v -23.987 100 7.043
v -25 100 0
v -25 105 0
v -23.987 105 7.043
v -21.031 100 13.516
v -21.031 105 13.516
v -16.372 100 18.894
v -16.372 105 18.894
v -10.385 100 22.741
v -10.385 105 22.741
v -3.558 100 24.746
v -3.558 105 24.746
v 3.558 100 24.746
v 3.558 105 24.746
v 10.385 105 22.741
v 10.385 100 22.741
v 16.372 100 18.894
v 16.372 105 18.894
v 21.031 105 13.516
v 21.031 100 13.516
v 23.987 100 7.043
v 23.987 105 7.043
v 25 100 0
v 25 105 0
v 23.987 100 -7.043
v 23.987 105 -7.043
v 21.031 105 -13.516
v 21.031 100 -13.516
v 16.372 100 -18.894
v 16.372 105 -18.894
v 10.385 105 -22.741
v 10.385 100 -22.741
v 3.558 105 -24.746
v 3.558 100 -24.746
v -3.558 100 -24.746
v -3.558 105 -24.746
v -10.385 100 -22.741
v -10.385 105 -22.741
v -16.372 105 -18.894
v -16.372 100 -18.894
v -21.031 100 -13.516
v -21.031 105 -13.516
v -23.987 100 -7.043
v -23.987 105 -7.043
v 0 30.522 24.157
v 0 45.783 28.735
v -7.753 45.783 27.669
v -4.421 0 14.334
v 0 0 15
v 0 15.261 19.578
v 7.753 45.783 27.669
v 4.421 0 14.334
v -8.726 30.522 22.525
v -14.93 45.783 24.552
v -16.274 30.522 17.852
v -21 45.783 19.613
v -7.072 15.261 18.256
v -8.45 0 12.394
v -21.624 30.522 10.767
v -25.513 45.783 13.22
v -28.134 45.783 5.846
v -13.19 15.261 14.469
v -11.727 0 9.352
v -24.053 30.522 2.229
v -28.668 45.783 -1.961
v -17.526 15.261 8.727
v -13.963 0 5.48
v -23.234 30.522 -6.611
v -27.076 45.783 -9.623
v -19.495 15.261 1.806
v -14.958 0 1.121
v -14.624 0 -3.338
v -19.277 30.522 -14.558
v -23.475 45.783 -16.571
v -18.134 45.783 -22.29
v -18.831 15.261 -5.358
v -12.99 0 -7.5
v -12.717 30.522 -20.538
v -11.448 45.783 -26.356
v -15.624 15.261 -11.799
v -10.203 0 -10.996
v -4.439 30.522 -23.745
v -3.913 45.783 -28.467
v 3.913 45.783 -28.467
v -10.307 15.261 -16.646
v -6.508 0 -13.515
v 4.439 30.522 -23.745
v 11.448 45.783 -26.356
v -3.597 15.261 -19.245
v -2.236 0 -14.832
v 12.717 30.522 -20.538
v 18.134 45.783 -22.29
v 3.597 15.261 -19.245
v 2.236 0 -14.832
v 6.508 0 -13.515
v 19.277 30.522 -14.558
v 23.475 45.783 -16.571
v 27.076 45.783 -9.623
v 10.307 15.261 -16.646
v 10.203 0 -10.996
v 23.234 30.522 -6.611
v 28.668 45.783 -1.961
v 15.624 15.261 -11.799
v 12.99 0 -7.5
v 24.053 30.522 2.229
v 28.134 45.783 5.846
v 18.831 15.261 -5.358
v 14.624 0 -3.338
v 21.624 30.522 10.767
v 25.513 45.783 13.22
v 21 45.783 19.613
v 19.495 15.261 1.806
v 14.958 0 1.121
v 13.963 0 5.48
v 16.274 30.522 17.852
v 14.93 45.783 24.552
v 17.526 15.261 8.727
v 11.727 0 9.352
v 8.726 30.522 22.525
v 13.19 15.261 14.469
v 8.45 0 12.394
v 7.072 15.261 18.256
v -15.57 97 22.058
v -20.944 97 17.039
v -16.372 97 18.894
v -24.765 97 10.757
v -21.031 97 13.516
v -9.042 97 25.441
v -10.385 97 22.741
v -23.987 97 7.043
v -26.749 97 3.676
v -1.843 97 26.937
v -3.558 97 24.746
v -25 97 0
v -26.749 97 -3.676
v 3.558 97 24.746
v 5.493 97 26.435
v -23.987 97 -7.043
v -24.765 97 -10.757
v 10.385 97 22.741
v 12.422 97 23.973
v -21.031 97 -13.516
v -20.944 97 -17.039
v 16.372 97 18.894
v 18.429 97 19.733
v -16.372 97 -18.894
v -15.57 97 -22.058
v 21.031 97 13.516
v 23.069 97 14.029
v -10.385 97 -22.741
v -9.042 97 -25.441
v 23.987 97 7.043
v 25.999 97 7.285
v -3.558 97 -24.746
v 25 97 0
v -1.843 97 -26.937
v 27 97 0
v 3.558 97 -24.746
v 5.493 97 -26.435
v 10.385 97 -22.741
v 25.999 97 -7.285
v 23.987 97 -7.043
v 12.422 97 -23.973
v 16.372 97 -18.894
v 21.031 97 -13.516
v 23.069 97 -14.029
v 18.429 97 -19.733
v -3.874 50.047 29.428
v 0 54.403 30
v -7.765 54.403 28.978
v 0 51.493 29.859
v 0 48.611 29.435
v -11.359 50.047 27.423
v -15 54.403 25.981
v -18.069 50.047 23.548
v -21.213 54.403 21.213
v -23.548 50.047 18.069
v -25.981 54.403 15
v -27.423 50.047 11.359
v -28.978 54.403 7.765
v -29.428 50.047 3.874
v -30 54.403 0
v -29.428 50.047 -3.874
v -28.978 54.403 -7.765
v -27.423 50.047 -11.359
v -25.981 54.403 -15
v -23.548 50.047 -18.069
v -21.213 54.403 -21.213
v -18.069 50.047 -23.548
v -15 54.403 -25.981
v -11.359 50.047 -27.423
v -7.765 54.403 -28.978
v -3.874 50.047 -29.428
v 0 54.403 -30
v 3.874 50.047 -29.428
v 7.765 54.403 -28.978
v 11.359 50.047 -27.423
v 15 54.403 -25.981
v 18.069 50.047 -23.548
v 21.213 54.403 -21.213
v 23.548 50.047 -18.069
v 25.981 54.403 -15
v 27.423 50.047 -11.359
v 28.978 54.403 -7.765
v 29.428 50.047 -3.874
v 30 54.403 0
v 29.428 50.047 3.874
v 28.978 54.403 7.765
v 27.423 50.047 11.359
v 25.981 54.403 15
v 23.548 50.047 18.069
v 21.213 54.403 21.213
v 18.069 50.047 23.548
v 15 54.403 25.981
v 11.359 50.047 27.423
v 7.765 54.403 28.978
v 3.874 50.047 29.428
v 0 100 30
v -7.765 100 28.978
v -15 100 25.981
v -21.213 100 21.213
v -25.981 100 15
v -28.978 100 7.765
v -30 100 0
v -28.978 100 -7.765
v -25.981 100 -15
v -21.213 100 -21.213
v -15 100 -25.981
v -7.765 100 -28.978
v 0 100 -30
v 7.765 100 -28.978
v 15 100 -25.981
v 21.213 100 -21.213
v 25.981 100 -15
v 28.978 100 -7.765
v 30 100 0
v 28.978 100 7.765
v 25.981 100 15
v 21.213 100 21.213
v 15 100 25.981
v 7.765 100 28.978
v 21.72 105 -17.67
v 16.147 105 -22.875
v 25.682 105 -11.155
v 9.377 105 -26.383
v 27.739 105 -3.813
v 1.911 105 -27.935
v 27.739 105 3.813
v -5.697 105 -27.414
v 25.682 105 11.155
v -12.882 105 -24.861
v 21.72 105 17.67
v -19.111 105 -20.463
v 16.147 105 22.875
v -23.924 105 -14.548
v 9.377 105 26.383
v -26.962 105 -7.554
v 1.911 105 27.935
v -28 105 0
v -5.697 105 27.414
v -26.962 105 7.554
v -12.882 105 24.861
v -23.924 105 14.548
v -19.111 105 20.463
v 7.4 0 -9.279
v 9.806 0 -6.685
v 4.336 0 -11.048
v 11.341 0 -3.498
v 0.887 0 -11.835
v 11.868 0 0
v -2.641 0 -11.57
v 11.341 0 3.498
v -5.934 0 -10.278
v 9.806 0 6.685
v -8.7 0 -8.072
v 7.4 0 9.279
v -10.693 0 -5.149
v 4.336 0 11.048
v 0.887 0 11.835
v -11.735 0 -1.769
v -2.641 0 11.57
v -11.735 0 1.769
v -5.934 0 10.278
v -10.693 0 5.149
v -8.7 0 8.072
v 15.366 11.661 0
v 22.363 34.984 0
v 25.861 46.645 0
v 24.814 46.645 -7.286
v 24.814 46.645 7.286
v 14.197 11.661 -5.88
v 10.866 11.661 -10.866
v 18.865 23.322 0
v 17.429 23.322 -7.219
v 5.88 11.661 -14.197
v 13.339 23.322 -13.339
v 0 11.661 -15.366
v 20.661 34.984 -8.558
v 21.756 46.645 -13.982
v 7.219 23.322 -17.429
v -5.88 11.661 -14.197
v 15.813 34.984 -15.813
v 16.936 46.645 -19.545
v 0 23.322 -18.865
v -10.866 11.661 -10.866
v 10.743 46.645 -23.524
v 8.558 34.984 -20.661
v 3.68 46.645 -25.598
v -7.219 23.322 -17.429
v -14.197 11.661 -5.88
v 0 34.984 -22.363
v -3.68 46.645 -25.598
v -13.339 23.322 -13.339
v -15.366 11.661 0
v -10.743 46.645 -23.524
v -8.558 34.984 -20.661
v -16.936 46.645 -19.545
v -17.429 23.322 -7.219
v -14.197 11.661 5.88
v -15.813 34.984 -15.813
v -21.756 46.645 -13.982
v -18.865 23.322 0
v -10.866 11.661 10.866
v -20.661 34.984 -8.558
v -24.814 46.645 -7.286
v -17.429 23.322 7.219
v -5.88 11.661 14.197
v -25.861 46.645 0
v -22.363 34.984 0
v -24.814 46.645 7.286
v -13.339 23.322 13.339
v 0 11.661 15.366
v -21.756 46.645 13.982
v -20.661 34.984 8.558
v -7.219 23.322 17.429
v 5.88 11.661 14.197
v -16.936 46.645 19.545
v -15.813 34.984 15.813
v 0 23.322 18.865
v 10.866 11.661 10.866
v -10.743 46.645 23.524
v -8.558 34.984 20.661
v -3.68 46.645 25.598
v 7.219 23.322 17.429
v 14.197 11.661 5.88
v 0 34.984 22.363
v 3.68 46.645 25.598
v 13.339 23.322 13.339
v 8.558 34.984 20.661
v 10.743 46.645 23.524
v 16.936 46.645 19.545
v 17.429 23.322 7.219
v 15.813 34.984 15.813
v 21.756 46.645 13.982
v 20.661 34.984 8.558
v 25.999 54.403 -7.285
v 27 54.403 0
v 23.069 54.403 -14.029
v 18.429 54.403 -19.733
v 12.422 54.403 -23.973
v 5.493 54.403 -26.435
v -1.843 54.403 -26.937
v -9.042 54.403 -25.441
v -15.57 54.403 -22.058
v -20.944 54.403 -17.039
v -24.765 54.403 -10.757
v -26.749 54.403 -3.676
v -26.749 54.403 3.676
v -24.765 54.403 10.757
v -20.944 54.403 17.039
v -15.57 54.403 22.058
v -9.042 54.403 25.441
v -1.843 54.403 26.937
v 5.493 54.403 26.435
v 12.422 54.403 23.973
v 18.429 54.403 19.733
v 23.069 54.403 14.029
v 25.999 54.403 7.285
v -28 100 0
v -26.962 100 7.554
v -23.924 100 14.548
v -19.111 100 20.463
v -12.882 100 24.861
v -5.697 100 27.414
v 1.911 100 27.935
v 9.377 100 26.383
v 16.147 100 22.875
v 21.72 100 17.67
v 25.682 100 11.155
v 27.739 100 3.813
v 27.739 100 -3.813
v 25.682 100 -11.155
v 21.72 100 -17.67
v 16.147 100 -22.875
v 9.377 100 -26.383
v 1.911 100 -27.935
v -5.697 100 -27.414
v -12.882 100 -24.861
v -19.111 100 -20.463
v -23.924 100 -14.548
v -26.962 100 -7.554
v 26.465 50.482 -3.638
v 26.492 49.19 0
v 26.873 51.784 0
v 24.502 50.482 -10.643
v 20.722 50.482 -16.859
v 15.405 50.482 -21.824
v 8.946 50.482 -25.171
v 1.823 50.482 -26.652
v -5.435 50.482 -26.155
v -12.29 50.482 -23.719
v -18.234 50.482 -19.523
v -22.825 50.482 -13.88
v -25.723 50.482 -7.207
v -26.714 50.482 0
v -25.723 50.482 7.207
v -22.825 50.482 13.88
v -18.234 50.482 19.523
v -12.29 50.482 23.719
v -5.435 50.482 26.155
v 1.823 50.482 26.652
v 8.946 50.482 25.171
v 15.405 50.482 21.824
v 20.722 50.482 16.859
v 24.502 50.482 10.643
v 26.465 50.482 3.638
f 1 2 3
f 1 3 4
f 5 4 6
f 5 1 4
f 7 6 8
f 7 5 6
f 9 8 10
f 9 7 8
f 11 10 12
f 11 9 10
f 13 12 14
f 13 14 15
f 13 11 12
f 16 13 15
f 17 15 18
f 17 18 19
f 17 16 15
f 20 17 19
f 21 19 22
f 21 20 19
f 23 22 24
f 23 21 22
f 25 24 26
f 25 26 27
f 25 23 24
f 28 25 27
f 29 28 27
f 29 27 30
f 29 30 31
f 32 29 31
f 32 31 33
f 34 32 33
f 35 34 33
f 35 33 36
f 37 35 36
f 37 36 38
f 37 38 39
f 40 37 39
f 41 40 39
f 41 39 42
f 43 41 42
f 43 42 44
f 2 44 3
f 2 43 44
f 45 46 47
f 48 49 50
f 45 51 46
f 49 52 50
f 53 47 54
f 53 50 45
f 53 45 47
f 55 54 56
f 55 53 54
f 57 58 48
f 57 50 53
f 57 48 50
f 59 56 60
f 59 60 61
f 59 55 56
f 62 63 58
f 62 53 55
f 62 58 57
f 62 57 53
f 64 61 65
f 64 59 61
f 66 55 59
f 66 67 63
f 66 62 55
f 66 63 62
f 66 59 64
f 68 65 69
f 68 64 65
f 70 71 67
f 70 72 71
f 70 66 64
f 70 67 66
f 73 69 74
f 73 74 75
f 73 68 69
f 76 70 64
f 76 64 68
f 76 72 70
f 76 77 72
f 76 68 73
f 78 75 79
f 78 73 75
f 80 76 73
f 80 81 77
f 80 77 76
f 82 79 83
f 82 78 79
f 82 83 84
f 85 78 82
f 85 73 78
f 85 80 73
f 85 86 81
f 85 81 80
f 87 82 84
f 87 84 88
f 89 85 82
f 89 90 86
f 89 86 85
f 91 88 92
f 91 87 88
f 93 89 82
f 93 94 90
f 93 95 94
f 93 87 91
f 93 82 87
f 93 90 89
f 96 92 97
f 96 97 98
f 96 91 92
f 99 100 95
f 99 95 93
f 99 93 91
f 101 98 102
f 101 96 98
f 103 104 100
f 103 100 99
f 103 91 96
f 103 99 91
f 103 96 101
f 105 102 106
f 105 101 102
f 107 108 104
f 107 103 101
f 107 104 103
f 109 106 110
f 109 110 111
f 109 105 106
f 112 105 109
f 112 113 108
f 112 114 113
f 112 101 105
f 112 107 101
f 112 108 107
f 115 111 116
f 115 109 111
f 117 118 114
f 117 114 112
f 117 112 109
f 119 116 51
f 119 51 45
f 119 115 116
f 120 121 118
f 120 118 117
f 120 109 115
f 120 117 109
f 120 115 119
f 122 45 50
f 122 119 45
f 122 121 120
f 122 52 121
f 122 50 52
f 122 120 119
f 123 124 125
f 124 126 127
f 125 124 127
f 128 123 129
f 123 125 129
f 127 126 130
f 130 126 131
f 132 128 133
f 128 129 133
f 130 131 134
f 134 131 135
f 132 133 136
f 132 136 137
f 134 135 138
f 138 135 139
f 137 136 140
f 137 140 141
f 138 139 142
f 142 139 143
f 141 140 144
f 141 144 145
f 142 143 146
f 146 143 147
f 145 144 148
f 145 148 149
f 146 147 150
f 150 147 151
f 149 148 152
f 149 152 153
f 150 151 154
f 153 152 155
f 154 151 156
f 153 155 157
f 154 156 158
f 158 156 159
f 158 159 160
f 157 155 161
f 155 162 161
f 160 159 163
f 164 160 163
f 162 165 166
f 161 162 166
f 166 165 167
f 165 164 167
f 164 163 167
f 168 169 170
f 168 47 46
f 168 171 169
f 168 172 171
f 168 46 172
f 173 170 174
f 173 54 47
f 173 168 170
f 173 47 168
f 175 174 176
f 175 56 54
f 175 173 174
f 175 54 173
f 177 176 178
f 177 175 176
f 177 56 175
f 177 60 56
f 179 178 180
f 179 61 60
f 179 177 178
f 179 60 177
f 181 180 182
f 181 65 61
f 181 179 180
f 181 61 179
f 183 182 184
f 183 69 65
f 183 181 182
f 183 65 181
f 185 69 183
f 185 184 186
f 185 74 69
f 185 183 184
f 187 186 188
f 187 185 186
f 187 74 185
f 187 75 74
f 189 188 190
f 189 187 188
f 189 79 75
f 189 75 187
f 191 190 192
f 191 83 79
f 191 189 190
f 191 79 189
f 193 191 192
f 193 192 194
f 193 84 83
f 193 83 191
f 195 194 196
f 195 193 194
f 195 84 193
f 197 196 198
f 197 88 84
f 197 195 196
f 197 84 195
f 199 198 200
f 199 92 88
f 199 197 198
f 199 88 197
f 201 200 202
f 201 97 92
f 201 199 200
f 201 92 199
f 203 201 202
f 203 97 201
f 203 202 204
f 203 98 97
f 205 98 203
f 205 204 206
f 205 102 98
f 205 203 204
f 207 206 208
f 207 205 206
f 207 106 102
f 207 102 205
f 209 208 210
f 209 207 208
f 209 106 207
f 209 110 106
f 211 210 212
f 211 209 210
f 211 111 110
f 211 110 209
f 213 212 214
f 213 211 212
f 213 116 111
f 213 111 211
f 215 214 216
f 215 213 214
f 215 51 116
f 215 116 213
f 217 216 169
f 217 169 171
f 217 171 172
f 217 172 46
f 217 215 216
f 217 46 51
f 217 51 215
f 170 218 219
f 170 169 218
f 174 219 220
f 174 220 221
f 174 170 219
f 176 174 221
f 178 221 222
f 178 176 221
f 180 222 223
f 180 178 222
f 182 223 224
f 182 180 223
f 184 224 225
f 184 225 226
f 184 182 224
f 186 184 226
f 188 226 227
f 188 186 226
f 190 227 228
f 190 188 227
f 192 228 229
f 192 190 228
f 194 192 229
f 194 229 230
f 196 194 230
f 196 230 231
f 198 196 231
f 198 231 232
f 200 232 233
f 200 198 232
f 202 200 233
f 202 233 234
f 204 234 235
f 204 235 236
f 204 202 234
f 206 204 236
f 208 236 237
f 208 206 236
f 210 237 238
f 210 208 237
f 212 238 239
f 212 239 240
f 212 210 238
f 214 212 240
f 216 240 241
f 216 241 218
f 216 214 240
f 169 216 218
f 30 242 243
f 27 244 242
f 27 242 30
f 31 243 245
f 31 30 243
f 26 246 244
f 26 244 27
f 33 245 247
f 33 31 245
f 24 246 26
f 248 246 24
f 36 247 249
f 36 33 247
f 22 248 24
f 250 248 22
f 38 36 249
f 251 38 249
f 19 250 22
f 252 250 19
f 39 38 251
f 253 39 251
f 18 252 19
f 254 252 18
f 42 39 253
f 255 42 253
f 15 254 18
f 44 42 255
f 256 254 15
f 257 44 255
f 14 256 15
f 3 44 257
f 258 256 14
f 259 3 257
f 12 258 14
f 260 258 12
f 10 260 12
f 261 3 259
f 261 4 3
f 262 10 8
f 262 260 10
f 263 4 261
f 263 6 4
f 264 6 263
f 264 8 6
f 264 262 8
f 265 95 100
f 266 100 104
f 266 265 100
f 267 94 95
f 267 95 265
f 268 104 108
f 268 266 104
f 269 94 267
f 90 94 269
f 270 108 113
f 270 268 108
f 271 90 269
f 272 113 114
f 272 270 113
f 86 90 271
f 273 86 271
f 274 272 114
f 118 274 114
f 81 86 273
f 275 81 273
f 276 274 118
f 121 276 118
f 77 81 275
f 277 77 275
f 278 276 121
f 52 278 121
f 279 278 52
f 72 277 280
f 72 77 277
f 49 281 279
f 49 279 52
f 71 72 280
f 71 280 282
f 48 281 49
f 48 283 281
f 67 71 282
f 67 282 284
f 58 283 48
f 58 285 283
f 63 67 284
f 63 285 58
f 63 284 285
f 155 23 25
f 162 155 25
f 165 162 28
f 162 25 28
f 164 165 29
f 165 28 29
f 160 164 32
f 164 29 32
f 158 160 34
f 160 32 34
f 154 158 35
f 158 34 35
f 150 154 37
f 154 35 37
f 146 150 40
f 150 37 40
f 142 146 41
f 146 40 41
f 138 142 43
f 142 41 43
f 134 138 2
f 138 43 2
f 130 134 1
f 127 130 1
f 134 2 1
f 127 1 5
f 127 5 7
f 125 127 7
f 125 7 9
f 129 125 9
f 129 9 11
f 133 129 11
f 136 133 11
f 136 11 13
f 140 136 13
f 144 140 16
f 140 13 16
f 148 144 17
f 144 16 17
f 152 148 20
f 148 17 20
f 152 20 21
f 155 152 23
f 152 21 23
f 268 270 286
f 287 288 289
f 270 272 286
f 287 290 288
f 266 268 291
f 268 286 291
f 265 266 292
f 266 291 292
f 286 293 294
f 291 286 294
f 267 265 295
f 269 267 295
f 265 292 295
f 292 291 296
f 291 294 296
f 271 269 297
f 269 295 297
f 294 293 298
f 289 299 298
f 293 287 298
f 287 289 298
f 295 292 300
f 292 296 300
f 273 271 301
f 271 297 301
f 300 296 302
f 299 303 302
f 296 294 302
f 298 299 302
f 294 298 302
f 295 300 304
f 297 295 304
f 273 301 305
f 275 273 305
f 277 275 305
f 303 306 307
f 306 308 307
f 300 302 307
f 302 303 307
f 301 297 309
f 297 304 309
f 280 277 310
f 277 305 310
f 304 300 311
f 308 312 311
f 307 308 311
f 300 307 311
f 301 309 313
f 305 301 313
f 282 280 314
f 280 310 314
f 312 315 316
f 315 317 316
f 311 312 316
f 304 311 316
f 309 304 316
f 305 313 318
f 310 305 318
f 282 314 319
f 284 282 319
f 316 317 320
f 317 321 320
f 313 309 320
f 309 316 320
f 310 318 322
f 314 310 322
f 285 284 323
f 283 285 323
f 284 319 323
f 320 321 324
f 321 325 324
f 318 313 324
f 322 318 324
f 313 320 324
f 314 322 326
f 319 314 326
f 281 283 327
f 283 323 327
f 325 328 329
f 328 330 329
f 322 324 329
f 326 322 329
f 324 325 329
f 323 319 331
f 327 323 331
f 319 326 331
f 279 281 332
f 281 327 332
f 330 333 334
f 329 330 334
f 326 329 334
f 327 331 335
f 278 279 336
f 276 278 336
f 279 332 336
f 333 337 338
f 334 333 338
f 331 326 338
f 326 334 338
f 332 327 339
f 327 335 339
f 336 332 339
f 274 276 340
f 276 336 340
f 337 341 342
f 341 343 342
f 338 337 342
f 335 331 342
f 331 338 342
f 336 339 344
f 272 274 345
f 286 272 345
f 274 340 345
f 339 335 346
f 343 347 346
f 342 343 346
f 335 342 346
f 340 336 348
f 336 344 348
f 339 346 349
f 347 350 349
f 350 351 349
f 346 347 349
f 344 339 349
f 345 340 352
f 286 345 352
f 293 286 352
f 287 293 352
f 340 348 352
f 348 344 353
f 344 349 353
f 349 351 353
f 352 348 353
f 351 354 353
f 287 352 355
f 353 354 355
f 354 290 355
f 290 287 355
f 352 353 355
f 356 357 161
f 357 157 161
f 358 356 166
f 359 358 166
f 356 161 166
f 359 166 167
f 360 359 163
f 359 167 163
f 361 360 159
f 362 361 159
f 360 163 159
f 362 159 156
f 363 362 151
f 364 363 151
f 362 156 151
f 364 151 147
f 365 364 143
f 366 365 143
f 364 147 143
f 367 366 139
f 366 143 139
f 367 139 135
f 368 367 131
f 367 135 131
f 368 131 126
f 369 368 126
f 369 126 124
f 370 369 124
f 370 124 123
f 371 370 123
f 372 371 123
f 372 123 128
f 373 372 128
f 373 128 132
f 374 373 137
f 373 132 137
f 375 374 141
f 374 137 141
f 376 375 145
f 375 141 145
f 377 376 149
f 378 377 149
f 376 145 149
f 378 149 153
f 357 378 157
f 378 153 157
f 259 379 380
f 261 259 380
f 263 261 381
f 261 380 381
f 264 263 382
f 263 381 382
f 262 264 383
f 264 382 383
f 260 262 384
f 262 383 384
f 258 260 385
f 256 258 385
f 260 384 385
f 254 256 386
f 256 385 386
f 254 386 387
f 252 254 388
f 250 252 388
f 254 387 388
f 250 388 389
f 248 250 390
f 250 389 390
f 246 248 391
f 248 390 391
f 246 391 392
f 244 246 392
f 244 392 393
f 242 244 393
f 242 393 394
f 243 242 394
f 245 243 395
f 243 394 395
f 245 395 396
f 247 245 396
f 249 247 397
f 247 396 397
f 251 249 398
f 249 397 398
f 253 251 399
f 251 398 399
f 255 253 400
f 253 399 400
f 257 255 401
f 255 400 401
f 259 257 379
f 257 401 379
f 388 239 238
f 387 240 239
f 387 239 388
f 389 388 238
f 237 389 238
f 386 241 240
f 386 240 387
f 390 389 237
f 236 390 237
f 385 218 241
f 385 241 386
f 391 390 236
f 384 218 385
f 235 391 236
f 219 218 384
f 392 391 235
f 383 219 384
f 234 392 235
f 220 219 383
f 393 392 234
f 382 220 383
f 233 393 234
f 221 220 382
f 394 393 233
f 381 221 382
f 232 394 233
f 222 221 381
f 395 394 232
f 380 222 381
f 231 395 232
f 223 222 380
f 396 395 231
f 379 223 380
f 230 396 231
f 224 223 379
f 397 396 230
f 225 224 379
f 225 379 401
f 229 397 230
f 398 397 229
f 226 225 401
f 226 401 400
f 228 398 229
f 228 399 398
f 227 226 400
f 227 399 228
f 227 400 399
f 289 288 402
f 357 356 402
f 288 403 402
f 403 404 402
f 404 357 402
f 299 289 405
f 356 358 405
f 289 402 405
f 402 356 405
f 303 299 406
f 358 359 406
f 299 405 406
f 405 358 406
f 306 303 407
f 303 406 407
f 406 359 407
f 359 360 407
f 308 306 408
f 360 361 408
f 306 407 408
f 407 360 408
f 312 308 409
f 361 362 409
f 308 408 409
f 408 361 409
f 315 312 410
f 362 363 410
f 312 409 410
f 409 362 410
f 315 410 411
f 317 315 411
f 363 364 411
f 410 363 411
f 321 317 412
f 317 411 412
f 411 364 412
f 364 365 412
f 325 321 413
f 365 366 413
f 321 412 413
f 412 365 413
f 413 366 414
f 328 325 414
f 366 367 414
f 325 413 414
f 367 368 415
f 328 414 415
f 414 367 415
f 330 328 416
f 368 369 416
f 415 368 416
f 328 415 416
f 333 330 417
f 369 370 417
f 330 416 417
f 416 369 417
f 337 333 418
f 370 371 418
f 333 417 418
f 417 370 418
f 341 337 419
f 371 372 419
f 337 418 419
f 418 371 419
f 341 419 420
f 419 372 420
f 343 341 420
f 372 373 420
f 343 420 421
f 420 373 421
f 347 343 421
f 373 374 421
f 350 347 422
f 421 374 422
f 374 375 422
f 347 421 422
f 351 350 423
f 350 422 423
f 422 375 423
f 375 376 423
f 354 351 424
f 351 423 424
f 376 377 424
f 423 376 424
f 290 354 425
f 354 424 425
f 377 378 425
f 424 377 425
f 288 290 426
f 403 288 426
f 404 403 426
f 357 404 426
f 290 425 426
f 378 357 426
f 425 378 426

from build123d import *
from build123d.topology import SkipClean

# Parameters (mm, degrees)
SKETCH2_R           = 28
SKETCH2_R_2         = 25
EXTRUDE_THIN1_DEPTH = 5


# Read off the part's stored shape, not the designer's step: Shell2
with BuildPart() as part:
    # Sketch1 → Revolve1 (revolve)
    with BuildSketch(Plane.XY, mode=Mode.PRIVATE) as revolve1_sk:
        with BuildLine():
            Line((0, 0), (0, 100))
            Line((0, 100), (30, 100))
            Line((30, 100), (30, 54.403065089))
            ThreePointArc((30, 54.403065089), (29.682011865, 50.046670749), (28.734788557, 45.782628522))
            Line((28.734788557, 45.782628522), (15, 0))
            Line((15, 0), (0, 0))
        make_face()
    revolve(revolve1_sk.sketch.rotate(Axis((0, 126.662122273, 0), (0, -1, 0)), 90), axis=Axis((0, 126.662122273, 0), (0, -1, 0)))

    # Sketch2 → Extrude-Thin1 (add)
    with BuildSketch(Plane(origin=(0, 100, 0), x_dir=(-1, 0, 0), z_dir=(0, 1, 0))):
        Circle(SKETCH2_R)
        Circle(SKETCH2_R_2, mode=Mode.SUBTRACT)
    extrude(amount=EXTRUDE_THIN1_DEPTH)

    # Shell2 outline → Shell2 (revolve, cut)
    with SkipClean():  # the faces are left unmerged after this step: merging them gives an invalid solid
        with BuildSketch(Plane.XY):
            with BuildLine():
                Line((25, 97), (25, 100))
                Line((25, 100), (0, 100))
                Line((0, 100), (0, 0))
                Line((0, 0), (11.867908047, 0))
                Line((11.867908047, 0), (25.861309693, 46.644672153))
                ThreePointArc((25.861309693, 46.644672153), (26.713810678, 50.482310183), (27, 54.403065116))
                Line((27, 54.403065116), (27, 97))
                Line((27, 97), (25, 97))
            make_face()
        revolve(axis=Axis((0, 0, 0), (0, 1, 0)), mode=Mode.SUBTRACT)


solid = part.part
